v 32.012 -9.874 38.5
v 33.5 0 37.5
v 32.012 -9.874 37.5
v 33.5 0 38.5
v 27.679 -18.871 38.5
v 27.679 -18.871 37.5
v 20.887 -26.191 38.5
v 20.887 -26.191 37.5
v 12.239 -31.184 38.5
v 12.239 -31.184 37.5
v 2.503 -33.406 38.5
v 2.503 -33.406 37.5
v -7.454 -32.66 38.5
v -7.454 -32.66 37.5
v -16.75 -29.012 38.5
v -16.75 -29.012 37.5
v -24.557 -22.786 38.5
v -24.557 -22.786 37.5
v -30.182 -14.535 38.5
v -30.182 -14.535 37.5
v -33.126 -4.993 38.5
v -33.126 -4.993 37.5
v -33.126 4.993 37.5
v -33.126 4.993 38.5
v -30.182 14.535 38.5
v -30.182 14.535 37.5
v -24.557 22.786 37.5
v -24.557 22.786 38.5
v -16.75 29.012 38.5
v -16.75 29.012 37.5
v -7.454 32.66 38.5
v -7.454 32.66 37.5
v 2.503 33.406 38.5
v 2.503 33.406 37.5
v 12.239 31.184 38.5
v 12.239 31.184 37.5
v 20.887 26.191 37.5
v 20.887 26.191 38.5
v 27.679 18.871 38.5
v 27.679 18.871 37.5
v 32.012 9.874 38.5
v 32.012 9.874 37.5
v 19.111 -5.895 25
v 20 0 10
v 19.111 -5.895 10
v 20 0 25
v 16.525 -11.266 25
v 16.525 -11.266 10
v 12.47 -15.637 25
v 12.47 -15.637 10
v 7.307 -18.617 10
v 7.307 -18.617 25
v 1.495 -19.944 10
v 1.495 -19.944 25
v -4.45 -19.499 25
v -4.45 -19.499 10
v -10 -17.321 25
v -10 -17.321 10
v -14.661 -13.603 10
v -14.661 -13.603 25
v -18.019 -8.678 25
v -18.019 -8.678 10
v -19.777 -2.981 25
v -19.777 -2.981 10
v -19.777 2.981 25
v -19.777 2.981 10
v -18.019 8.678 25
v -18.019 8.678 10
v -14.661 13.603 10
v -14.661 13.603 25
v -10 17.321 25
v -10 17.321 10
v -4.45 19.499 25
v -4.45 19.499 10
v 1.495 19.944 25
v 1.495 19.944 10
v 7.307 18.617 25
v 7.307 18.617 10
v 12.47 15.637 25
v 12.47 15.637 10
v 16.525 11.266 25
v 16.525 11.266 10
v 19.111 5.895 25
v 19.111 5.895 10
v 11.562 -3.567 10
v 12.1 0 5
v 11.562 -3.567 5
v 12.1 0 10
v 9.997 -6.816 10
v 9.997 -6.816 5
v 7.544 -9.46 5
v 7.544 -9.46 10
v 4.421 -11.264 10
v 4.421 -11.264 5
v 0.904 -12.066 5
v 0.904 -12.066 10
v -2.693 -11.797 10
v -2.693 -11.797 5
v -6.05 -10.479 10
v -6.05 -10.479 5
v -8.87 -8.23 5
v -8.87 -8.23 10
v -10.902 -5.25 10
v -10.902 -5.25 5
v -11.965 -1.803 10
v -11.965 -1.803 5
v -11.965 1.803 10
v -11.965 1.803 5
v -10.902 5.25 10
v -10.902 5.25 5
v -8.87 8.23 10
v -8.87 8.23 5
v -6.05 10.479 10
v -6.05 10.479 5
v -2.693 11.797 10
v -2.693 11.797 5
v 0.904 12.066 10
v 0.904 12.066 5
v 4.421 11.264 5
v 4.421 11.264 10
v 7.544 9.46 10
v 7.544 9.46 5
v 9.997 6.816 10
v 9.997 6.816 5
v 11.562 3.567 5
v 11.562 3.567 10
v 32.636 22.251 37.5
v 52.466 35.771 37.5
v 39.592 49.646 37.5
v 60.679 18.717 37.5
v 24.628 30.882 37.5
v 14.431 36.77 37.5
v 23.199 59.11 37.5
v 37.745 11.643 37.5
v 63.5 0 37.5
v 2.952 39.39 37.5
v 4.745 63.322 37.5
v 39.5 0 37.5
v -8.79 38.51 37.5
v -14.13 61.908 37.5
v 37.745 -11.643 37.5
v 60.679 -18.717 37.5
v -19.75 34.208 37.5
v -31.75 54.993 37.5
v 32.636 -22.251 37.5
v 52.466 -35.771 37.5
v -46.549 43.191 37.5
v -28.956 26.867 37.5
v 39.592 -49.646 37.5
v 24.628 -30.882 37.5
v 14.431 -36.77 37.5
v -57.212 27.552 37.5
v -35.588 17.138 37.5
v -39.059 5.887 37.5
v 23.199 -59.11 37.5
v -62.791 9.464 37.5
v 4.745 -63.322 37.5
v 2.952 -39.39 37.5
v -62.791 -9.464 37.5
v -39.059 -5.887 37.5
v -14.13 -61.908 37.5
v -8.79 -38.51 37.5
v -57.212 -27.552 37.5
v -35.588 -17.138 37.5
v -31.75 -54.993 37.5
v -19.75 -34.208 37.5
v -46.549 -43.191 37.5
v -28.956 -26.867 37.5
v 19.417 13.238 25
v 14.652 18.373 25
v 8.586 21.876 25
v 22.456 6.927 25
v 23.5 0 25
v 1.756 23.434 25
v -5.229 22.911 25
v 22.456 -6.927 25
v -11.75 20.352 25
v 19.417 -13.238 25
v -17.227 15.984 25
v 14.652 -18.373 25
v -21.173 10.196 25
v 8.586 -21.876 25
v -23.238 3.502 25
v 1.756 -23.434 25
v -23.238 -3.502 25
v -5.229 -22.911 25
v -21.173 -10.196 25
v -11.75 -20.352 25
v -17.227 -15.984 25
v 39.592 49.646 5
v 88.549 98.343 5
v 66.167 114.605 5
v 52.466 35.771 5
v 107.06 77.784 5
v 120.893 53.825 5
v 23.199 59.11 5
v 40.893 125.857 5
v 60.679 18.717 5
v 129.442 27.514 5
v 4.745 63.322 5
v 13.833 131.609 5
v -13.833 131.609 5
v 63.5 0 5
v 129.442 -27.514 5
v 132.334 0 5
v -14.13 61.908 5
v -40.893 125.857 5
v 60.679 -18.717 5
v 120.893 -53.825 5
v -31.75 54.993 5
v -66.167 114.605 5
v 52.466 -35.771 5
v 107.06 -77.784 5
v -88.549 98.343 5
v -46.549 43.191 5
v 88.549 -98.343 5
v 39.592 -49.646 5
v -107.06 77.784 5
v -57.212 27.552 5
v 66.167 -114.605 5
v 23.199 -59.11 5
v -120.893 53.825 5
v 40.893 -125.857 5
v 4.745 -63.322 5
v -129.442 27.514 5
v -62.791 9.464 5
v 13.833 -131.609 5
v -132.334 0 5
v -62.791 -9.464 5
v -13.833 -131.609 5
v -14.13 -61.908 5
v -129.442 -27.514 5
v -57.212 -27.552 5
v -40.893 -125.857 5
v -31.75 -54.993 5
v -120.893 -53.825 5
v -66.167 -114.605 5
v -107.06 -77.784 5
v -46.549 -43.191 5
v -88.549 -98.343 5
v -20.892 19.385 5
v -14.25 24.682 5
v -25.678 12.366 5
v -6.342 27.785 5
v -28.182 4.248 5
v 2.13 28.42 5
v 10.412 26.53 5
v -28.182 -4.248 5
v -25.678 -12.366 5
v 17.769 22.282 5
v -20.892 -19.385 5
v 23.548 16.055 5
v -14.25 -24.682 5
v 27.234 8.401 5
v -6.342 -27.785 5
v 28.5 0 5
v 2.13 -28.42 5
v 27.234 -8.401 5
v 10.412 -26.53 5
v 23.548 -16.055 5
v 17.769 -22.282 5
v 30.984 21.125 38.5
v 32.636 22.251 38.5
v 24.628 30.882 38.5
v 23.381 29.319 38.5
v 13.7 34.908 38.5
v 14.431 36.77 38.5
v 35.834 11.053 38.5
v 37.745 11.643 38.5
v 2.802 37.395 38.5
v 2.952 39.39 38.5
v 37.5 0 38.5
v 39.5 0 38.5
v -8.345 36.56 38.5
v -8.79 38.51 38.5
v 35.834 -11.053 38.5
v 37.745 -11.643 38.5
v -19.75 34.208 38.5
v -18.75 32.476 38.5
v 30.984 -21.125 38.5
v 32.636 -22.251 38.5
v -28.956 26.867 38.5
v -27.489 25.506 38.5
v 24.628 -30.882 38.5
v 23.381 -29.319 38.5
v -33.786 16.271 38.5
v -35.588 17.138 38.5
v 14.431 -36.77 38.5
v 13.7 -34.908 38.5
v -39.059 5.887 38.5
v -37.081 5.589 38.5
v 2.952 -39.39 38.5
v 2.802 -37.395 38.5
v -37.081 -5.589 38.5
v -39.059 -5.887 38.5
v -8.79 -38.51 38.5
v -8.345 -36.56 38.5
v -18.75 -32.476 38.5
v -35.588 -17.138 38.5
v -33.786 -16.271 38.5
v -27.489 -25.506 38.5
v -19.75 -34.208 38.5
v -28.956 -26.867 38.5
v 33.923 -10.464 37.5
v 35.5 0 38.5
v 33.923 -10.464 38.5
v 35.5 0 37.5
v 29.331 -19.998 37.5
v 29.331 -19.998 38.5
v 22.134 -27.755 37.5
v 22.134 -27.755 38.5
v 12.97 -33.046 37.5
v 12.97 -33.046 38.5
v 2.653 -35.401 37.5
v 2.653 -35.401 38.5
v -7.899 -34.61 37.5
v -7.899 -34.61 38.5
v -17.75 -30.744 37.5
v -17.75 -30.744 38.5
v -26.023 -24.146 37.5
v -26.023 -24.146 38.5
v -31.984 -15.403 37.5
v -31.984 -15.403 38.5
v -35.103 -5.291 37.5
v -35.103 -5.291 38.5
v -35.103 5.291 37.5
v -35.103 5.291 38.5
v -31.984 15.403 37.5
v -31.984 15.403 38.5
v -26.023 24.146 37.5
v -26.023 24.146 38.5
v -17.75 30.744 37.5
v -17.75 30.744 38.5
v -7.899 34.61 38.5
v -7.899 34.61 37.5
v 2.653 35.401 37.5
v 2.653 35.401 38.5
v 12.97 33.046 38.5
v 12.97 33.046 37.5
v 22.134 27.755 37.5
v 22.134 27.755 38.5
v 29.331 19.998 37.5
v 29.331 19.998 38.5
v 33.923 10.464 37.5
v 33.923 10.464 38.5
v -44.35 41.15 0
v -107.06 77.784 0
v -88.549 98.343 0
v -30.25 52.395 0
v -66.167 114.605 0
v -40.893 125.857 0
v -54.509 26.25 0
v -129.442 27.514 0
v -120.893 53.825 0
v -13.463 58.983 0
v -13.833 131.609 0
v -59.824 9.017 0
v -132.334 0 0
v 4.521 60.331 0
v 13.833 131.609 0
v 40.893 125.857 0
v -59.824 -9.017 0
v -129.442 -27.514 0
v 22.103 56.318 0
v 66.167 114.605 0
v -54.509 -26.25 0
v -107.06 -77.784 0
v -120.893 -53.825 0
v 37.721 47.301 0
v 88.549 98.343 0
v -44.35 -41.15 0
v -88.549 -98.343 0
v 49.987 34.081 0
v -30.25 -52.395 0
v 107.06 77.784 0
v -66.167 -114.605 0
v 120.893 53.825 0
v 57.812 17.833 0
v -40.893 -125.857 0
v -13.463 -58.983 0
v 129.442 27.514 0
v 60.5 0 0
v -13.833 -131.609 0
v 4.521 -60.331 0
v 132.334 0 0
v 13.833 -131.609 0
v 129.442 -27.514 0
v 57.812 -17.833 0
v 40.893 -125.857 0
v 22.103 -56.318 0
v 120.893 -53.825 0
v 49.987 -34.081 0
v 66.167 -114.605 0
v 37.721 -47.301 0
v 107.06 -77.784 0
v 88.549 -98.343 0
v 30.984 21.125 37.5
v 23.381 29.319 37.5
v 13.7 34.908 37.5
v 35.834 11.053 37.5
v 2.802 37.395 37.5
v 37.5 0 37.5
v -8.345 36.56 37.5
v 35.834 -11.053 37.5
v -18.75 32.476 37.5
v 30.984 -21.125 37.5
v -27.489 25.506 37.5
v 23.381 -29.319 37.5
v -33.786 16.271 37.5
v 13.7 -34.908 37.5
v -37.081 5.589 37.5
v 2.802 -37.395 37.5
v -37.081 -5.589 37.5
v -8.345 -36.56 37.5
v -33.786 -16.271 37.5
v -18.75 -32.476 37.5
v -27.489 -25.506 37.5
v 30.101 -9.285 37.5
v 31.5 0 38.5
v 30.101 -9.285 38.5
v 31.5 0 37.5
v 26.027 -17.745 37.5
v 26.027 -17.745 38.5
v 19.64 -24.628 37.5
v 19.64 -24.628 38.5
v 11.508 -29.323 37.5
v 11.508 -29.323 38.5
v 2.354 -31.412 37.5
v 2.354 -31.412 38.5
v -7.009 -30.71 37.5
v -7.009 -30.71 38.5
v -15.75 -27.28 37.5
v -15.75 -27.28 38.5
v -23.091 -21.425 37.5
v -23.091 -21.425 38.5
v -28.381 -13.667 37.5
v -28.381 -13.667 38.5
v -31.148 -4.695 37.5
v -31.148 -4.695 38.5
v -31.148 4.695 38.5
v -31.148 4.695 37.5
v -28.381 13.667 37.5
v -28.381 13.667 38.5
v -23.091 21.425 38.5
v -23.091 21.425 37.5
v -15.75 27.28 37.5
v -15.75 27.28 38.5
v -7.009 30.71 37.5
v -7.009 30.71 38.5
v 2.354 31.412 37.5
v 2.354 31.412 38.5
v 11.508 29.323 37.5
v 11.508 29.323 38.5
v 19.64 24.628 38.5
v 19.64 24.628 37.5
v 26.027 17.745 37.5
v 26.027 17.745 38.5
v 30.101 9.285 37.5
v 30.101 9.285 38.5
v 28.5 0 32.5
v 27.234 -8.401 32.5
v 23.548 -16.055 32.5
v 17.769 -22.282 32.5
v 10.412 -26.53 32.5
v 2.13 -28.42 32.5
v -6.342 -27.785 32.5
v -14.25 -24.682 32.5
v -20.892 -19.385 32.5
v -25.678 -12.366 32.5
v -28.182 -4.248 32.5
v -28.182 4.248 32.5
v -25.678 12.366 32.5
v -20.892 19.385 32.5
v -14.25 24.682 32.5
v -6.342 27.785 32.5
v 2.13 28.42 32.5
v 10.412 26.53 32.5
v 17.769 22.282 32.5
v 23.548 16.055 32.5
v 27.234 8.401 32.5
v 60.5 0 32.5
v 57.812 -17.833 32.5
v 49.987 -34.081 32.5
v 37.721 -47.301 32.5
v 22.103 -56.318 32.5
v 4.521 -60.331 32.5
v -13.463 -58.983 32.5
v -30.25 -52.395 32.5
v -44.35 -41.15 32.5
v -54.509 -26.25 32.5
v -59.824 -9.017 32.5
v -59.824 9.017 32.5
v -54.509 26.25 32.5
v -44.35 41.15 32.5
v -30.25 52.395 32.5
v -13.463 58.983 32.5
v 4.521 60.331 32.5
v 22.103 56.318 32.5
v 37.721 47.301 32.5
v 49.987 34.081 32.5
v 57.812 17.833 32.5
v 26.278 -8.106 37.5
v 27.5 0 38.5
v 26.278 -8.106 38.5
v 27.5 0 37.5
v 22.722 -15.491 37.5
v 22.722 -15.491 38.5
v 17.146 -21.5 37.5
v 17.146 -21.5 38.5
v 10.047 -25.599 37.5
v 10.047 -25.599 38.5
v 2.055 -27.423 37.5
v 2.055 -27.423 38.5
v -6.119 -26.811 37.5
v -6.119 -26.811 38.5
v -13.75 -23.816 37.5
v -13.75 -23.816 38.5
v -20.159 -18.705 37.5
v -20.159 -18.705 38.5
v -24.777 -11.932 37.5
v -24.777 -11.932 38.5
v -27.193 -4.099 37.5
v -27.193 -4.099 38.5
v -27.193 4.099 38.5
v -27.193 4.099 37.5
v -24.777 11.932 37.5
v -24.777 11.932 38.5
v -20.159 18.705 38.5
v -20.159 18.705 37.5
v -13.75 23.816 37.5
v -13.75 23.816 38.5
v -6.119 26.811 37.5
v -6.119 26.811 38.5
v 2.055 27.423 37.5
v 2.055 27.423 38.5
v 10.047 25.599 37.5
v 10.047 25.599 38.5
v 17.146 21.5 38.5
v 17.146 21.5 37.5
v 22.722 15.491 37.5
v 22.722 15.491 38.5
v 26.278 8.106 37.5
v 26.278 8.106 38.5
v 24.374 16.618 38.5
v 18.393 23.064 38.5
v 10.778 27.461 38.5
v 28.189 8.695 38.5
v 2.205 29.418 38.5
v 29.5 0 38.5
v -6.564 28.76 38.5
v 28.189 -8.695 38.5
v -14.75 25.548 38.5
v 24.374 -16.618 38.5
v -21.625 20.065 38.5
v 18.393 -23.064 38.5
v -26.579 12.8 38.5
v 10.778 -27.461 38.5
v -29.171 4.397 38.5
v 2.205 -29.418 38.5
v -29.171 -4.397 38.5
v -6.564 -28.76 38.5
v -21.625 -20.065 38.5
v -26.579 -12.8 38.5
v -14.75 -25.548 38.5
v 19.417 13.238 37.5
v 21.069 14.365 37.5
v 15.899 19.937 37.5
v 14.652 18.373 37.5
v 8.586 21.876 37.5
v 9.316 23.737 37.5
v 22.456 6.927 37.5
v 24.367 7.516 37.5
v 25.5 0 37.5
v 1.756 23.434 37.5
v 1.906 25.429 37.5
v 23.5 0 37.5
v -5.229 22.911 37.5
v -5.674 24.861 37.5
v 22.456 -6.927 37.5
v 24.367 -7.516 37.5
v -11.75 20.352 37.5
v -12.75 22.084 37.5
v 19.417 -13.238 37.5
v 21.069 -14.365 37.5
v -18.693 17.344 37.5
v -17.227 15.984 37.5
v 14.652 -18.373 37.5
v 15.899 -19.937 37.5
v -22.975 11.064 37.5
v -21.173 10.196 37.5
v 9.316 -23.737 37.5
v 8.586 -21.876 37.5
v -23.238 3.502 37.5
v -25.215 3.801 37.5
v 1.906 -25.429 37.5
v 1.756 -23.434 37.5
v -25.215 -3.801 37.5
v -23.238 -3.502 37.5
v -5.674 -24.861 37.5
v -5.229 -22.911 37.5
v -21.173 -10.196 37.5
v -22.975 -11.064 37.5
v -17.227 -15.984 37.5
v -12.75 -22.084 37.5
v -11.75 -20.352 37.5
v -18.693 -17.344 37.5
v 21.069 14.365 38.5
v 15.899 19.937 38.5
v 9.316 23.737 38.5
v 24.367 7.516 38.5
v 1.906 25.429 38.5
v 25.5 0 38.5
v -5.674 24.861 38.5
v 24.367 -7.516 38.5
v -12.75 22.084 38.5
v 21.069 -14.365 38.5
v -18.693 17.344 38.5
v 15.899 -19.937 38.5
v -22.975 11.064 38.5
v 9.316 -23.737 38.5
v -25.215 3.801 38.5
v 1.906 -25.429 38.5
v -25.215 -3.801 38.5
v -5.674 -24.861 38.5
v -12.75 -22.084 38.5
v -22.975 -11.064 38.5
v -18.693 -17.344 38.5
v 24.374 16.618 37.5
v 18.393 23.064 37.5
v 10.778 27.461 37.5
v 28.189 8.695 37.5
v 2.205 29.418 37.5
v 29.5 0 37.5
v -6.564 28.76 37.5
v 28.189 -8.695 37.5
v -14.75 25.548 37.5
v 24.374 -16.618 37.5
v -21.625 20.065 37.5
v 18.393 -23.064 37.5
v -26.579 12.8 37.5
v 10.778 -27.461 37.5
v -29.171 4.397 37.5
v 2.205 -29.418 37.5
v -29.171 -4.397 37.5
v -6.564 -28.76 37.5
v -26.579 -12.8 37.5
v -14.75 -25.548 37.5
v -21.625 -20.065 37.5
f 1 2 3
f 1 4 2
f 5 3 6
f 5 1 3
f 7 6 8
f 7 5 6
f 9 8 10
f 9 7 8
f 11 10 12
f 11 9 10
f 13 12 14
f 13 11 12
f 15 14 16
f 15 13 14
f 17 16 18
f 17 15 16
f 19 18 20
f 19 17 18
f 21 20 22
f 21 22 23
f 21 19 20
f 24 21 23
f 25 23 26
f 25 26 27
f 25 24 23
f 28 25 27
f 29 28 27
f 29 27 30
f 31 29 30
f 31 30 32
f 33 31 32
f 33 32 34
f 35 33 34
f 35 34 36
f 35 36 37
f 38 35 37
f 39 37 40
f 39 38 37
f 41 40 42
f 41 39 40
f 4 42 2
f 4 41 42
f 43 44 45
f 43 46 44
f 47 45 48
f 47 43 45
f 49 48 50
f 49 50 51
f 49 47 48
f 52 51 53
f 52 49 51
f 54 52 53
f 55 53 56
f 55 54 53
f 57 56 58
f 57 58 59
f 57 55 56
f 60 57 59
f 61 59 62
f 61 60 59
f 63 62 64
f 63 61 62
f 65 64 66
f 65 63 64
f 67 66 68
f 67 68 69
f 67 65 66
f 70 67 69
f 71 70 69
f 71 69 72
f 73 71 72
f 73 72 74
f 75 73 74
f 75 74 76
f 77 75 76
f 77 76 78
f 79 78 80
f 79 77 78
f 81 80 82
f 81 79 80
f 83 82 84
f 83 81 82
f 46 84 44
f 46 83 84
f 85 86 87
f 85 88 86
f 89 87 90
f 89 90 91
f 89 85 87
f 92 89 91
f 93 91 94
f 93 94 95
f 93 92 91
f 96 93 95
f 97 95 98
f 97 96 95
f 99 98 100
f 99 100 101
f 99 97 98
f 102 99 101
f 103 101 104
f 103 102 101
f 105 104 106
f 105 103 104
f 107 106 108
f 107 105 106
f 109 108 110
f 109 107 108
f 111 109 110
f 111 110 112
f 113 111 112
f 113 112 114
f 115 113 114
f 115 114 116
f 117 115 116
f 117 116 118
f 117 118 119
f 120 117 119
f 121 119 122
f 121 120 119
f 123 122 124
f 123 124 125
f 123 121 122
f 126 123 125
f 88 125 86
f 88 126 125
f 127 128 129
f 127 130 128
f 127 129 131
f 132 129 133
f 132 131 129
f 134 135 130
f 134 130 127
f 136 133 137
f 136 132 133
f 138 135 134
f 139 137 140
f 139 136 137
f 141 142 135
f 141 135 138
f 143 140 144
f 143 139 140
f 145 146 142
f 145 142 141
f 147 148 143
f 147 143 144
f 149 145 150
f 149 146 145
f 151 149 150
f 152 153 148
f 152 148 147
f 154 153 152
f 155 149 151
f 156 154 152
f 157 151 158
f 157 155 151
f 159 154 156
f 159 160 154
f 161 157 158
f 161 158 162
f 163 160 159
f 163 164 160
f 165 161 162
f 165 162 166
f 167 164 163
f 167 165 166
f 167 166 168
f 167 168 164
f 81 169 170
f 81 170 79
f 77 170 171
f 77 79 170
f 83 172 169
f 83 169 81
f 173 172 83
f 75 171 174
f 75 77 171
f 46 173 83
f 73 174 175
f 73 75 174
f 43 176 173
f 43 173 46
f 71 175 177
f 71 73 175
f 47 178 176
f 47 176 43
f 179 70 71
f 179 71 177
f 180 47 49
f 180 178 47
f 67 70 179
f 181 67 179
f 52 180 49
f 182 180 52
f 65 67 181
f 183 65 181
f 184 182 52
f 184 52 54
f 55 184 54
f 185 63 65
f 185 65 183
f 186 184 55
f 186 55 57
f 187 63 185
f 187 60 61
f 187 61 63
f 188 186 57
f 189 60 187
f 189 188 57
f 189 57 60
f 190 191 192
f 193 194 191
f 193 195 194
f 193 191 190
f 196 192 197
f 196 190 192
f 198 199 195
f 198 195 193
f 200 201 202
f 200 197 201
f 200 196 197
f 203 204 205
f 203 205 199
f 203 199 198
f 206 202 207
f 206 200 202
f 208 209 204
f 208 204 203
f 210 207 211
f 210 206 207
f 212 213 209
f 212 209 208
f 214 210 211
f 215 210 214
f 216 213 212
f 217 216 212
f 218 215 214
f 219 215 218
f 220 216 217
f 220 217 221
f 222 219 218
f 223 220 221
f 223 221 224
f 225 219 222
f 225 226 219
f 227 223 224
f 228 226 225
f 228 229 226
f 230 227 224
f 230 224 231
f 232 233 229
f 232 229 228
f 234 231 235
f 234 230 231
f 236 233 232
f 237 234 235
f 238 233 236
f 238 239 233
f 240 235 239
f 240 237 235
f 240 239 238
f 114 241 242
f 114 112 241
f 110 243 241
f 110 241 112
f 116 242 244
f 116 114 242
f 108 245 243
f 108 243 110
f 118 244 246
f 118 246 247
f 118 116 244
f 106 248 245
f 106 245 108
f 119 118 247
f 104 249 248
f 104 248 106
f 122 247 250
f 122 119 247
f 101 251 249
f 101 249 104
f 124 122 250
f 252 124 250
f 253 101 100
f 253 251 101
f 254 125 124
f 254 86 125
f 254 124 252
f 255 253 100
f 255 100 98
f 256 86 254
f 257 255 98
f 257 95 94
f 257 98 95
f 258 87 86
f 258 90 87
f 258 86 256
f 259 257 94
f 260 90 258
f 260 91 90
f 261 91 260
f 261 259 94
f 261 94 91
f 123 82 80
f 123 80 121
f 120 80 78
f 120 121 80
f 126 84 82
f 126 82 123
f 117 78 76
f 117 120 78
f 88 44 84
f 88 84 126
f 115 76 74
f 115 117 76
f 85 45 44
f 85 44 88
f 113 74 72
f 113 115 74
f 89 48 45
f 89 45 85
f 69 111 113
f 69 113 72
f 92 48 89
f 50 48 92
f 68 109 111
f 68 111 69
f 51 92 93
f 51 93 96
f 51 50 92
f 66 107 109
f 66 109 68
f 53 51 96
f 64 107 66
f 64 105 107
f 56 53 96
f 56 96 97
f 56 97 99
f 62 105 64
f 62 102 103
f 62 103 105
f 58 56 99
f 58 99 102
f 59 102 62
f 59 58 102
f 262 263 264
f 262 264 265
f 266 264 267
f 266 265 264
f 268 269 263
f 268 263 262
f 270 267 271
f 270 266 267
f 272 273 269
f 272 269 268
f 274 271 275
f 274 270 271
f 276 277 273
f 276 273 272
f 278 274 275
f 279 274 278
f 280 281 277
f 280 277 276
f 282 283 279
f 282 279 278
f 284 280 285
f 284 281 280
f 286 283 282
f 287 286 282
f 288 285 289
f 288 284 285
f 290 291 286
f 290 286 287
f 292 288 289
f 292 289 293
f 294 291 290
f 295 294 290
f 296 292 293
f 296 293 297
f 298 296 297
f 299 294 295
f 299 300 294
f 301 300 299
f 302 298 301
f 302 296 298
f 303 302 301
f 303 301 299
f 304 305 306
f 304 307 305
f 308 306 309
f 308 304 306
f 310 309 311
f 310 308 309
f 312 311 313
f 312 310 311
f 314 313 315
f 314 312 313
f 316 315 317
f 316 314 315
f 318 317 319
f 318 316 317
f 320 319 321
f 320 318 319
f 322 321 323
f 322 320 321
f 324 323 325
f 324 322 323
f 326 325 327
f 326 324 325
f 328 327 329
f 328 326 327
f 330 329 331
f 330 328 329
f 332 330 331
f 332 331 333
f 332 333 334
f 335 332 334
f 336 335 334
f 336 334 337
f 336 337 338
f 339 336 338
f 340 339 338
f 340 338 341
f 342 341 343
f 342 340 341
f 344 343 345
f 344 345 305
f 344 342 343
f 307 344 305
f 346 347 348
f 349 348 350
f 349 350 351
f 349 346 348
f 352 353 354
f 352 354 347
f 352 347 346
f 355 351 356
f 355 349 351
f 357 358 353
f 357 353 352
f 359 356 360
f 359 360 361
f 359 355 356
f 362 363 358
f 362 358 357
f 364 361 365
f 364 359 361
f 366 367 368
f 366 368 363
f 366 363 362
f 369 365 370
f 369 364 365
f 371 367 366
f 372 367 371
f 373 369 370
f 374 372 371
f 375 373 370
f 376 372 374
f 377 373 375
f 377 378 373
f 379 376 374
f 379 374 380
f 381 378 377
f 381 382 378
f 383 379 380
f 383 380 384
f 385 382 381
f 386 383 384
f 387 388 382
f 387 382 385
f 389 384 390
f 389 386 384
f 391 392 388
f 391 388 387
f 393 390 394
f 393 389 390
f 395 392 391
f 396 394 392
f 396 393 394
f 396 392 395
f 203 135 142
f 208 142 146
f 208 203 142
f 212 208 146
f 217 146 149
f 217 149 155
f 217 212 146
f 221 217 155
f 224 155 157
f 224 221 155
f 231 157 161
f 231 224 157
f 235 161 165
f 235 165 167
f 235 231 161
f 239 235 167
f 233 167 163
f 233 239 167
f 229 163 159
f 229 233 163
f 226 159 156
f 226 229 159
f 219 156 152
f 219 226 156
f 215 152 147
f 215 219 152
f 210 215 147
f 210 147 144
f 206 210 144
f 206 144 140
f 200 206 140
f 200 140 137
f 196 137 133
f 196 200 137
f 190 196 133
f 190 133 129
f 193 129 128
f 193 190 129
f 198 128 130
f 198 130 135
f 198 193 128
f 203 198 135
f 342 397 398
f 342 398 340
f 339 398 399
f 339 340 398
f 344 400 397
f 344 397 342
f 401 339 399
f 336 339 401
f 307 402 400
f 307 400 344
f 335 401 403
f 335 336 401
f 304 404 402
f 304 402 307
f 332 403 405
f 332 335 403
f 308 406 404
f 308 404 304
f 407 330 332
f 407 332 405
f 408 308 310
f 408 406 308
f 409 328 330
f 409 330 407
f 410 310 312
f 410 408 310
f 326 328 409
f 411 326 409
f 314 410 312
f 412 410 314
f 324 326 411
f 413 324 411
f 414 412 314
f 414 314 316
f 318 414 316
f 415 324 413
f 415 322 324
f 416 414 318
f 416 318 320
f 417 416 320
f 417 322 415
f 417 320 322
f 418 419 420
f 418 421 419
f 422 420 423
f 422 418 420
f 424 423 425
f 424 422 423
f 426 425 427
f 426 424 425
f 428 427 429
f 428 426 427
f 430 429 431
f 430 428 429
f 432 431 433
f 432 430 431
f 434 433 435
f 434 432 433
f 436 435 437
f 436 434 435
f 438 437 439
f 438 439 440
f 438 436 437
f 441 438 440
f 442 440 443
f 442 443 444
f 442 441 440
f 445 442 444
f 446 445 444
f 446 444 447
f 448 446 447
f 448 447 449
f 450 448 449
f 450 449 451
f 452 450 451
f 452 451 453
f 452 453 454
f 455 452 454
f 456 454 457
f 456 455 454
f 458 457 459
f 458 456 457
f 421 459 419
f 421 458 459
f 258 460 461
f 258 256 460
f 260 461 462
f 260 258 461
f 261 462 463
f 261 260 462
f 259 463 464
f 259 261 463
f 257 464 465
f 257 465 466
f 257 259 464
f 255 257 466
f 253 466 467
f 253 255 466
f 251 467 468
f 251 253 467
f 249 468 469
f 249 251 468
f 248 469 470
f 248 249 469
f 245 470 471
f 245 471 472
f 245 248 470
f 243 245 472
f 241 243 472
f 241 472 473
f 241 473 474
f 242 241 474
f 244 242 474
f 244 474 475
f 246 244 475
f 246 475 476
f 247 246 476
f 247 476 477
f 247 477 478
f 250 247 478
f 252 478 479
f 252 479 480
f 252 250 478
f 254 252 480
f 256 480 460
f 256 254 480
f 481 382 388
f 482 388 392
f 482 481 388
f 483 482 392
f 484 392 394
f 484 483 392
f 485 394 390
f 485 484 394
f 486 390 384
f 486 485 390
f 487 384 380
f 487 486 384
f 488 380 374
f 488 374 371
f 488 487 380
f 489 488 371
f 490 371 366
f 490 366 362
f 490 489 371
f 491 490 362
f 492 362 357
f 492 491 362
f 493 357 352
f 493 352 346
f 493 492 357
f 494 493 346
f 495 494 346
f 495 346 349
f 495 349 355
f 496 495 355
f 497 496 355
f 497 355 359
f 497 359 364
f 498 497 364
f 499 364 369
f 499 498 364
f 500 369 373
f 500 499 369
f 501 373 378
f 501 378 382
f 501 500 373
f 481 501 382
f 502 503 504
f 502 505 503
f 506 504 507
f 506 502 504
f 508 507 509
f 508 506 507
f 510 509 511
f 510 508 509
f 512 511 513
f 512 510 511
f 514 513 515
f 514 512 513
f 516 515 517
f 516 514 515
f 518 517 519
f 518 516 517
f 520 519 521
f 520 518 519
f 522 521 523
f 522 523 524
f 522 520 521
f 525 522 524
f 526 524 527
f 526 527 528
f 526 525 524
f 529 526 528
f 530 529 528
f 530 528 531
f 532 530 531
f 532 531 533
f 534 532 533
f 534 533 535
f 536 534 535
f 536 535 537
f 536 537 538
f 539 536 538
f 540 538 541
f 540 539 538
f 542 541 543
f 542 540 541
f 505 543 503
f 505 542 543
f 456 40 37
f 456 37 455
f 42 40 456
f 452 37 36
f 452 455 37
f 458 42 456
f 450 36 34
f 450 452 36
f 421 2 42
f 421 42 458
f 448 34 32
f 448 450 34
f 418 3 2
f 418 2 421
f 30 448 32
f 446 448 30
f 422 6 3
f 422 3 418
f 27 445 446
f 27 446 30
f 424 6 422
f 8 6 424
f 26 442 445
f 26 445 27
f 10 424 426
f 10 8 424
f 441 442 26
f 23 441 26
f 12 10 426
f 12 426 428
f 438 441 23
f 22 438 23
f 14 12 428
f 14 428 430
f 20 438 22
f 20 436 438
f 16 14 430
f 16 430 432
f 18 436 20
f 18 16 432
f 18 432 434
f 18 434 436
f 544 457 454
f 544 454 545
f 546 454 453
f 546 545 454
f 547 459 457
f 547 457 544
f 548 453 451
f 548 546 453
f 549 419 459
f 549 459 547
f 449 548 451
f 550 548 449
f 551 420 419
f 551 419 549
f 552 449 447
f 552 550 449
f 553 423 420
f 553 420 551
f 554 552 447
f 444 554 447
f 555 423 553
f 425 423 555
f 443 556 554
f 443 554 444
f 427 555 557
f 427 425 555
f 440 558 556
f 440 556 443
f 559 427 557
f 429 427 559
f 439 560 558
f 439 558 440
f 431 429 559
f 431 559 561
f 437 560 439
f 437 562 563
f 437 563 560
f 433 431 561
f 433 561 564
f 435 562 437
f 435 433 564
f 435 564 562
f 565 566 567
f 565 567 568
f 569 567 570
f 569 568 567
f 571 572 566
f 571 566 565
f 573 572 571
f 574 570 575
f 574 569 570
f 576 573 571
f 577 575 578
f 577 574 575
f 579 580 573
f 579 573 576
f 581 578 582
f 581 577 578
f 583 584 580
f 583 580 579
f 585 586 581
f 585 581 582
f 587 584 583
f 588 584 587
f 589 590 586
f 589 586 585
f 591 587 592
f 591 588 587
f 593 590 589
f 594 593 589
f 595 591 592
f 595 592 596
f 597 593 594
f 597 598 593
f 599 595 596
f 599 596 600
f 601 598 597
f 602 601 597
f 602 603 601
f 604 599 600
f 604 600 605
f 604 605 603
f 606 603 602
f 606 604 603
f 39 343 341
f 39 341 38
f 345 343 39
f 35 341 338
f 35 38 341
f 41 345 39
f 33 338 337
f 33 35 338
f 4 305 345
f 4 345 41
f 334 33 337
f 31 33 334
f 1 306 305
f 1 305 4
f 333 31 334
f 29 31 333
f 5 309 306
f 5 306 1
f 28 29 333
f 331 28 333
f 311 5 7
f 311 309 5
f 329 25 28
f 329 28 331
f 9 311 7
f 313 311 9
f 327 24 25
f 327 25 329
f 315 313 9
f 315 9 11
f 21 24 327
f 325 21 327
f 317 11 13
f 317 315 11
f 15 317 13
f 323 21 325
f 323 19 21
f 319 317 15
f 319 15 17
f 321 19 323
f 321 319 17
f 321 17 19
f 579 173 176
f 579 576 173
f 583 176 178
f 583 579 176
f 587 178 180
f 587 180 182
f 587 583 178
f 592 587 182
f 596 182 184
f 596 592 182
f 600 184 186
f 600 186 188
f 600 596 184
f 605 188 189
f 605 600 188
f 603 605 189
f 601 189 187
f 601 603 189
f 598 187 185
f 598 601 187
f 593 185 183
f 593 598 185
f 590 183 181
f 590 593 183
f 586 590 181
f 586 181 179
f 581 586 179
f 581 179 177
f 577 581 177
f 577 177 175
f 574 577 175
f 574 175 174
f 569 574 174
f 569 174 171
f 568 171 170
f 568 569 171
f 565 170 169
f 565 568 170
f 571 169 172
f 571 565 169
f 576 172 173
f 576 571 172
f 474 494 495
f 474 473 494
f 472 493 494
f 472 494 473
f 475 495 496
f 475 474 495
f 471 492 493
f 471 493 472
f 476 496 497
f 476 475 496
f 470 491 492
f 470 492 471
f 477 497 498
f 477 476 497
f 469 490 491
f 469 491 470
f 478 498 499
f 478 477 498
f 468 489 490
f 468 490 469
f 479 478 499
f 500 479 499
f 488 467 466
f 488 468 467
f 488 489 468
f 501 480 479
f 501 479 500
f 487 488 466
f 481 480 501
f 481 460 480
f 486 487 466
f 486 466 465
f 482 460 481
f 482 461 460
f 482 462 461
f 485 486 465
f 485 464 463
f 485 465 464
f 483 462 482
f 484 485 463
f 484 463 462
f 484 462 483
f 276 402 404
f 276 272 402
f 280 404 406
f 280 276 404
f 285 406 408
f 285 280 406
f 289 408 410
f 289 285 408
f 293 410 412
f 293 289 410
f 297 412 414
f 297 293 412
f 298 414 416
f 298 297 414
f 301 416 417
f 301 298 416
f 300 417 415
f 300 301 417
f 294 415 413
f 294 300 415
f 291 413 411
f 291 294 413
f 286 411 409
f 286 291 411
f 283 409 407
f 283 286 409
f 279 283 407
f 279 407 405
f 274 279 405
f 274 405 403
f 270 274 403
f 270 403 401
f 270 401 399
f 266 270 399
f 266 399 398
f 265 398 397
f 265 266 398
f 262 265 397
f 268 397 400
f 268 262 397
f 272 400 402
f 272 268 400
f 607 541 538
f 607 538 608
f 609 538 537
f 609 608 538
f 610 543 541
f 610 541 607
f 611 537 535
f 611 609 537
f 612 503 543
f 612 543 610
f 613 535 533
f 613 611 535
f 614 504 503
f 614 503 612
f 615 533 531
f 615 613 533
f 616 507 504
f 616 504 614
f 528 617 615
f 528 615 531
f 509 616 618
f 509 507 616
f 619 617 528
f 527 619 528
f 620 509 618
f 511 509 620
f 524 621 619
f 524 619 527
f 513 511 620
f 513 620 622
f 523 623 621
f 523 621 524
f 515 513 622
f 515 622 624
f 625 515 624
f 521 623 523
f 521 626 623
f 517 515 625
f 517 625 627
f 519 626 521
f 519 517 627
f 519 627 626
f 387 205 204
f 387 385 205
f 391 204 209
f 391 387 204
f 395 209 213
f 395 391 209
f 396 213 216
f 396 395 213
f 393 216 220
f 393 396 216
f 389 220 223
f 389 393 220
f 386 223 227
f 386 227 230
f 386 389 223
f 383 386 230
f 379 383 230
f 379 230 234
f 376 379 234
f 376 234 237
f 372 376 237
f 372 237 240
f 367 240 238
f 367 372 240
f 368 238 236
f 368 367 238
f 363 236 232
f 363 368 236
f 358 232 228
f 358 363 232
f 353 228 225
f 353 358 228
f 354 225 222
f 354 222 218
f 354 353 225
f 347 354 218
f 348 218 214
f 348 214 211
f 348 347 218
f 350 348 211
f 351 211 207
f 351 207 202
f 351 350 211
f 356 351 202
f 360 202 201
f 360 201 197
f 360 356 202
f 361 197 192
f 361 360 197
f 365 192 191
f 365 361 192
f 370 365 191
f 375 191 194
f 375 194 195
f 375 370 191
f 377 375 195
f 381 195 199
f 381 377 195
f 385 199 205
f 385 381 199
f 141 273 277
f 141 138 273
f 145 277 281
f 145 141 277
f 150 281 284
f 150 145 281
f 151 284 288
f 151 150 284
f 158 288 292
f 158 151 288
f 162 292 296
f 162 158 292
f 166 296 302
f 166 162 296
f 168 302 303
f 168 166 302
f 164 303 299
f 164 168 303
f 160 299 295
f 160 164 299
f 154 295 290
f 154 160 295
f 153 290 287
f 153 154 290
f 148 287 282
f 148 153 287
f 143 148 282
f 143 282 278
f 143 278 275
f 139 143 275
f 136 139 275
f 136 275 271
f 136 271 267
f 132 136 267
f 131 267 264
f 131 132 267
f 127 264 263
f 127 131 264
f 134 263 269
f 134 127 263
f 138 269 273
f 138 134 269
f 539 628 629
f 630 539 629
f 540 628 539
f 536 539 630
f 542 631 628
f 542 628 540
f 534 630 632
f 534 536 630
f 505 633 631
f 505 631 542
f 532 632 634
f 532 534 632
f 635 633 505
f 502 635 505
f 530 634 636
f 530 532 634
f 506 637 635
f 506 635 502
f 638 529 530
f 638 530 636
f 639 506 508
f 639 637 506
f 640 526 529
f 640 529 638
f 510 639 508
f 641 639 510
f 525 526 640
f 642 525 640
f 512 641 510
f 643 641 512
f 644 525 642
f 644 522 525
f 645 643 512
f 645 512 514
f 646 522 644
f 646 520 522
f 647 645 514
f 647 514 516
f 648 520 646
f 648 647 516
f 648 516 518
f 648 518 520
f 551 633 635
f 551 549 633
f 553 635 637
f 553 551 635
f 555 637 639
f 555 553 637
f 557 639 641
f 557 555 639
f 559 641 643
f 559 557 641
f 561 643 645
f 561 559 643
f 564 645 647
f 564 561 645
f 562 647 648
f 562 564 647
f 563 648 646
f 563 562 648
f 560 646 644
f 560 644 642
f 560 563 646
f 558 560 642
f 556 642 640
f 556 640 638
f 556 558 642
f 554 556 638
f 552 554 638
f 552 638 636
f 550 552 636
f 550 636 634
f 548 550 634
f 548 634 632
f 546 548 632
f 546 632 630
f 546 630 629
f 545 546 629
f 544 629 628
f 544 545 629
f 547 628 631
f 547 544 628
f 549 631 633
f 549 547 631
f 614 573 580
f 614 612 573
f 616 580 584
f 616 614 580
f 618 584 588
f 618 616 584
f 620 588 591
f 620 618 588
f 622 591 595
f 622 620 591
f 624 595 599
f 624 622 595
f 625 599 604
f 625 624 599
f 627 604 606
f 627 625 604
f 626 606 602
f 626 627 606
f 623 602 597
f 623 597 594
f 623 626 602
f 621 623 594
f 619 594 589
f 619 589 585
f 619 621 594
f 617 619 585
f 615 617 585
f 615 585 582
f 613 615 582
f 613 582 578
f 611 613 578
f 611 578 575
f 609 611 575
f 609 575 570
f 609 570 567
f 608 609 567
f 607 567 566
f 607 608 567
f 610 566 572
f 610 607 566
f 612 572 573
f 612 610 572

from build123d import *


with BuildPart() as part:
    # Sketch1 → Revolve1 (revolve)
    with BuildSketch(Plane.YZ, mode=Mode.PRIVATE) as revolve1_sk:
        Polygon((-28.5, 32.5), (-28.5, 5), (-12.1, 5), (-12.1, 10), (-20, 10), (-20, 25), (-23.5, 25), (-23.5, 37.5), (-25.5, 37.5), (-25.5, 38.5), (-27.5, 38.5), (-27.5, 37.5), (-29.5, 37.5), (-29.5, 38.5), (-31.5, 38.5), (-31.5, 37.5), (-33.5, 37.5), (-33.5, 38.5), (-35.5, 38.5), (-35.5, 37.5), (-37.5, 37.5), (-37.5, 38.5), (-39.5, 38.5), (-39.5, 37.5), (-63.5, 37.5), (-63.5, 5), (-132.334, 5), (-132.334, 0), (-60.5, 0), (-60.5, 32.5), align=None)
    revolve(revolve1_sk.sketch.rotate(Axis((0, 0, 1538.348894466), (0, 0, -1)), 270), axis=Axis((0, 0, 1538.348894466), (0, 0, -1)))


solid = part.part
